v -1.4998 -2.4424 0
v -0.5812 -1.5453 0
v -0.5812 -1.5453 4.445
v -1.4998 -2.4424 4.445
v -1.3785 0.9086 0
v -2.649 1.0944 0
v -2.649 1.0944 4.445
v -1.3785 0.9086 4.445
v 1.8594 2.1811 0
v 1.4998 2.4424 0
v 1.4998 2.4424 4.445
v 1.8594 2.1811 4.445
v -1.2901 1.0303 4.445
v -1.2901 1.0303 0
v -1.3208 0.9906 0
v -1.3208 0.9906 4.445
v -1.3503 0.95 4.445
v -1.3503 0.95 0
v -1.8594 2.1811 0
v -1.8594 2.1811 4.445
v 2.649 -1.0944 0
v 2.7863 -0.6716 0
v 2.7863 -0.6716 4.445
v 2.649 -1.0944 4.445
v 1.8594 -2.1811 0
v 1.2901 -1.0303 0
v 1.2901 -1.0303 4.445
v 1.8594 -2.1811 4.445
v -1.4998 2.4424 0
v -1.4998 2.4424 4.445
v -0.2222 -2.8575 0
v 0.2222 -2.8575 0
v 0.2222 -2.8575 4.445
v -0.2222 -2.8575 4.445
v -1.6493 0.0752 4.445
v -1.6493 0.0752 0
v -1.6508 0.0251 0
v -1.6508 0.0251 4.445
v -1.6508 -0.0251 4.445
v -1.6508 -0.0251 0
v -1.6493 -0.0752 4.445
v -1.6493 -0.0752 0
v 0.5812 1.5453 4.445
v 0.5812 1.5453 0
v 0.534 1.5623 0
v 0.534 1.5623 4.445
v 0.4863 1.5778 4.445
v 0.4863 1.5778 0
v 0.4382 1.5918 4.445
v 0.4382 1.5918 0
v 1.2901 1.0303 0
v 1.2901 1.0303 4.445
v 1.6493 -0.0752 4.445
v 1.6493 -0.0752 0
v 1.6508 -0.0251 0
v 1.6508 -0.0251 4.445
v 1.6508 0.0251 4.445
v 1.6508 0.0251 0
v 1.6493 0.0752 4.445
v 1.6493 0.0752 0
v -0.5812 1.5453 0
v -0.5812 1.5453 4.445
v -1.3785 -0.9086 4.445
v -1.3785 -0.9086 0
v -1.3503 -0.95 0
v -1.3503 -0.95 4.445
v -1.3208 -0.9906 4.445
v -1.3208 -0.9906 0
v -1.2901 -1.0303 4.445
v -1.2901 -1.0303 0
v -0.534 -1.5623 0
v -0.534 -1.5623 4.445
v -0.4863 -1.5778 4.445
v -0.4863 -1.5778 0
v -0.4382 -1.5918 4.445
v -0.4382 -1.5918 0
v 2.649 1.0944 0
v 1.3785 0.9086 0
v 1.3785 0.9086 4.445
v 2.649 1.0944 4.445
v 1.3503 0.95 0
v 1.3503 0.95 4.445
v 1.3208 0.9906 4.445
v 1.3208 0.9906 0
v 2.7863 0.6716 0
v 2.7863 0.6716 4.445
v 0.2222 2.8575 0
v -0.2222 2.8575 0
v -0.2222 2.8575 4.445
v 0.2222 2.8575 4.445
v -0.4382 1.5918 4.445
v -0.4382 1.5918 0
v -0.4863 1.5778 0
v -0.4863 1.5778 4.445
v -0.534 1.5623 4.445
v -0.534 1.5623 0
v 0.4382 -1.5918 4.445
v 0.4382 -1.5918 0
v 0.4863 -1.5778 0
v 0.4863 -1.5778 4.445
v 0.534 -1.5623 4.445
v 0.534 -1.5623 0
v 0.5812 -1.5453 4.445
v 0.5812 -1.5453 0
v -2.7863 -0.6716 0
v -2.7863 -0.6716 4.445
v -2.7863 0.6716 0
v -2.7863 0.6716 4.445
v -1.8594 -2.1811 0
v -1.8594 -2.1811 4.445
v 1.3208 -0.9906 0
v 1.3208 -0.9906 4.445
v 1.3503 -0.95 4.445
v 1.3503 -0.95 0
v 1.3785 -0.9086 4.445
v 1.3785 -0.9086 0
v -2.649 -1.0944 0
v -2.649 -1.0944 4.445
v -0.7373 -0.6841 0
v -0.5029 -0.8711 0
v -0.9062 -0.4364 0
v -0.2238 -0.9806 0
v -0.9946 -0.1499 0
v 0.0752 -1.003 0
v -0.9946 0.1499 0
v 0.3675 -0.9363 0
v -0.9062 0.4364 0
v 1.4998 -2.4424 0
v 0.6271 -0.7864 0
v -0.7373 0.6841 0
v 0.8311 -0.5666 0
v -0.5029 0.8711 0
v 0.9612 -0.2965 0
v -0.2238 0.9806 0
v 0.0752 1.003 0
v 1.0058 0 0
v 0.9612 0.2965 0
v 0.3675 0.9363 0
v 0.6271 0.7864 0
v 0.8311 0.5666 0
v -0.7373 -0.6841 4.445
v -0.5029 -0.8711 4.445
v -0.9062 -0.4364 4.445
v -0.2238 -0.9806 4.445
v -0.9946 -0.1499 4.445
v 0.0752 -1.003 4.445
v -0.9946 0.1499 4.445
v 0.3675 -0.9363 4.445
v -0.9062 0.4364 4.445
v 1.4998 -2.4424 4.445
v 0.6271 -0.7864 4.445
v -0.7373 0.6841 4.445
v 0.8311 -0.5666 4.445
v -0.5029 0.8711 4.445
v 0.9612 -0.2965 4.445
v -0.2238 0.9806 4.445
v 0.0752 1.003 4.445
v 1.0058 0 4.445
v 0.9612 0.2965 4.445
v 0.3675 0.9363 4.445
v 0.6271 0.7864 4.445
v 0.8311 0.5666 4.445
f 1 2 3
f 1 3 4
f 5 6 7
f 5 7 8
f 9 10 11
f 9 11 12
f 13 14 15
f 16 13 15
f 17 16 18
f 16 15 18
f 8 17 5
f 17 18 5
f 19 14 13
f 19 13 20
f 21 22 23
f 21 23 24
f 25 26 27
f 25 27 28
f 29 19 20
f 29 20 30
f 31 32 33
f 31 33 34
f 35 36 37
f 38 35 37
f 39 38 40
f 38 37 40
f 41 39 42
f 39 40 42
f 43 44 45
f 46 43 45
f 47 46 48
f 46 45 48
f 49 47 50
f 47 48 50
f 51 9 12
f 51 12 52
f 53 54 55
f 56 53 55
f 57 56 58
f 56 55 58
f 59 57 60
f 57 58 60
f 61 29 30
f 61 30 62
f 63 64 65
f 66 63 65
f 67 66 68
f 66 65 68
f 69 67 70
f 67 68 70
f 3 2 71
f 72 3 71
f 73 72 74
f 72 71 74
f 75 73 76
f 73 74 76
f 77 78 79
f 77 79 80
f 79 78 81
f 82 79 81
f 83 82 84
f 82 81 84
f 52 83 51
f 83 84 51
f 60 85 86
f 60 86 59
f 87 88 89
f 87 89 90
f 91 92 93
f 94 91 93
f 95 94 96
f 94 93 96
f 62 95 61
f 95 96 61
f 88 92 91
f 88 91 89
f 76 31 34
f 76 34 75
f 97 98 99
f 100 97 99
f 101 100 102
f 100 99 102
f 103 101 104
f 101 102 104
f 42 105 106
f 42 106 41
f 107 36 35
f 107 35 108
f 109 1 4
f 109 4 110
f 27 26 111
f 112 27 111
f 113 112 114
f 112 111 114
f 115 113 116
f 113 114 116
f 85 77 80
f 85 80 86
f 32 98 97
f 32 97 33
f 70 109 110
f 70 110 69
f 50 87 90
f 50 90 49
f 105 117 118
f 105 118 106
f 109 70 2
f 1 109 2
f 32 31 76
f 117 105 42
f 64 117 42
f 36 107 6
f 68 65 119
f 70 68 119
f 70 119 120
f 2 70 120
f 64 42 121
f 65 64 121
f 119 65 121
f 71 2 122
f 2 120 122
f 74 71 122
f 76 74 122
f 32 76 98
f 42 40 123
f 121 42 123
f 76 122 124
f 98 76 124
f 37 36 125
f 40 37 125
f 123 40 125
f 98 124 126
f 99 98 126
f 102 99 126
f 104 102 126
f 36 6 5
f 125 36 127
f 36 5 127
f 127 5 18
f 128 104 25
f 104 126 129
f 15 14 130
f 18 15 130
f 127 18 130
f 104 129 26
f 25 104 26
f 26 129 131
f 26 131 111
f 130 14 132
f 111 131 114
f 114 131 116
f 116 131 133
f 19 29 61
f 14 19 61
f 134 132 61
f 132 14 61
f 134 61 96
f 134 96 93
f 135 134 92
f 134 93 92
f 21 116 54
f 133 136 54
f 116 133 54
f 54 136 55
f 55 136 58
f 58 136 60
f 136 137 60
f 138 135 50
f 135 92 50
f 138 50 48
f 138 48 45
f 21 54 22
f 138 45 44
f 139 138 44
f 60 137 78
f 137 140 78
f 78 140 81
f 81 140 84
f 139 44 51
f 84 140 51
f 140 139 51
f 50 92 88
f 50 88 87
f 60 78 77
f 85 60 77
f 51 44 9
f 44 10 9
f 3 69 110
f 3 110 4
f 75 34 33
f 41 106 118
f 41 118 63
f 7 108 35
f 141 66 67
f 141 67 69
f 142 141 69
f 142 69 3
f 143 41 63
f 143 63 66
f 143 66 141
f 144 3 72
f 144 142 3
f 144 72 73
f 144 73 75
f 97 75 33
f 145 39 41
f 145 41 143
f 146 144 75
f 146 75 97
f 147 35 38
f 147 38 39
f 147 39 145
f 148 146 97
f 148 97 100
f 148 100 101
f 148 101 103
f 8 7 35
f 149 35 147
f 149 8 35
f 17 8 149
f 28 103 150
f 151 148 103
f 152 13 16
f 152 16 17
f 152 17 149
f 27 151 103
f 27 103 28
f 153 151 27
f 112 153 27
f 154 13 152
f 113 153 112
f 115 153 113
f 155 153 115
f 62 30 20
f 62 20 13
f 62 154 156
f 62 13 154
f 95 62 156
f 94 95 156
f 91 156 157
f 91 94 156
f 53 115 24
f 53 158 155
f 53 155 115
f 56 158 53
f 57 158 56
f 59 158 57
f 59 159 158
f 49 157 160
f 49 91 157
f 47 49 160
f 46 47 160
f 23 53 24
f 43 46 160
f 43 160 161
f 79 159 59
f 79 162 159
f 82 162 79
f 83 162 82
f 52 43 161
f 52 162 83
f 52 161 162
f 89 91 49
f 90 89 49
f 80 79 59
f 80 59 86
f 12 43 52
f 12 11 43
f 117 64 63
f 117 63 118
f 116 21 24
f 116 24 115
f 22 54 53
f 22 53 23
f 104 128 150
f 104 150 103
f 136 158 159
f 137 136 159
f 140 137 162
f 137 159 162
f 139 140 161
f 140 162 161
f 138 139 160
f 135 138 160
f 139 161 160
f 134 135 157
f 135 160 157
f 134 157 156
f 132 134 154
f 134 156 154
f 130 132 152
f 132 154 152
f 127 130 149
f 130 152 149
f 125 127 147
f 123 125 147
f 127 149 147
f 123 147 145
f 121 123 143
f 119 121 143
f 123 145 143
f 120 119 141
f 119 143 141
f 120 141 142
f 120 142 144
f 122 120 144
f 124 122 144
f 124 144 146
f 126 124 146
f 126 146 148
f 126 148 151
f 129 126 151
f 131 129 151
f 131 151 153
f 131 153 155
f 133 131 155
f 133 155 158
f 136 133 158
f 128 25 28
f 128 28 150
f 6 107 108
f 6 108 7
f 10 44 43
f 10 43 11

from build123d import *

# Parameters (mm, degrees)
SKETCH1_R           = 1.651
BOSS_EXTRUDE1_DEPTH = 4.445
SKETCH2_R           = 1.00584
CUT_EXTRUDE1_DEPTH  = 6.973853634


with BuildPart() as part:
    # Sketch1 → Boss-Extrude1 (new body)
    with BuildSketch(Plane.XY):
        Circle(SKETCH1_R)
        Polygon((-0.22225, 2.8575), (0.22225, 2.8575), (0.43815, 1.591799478), (-0.43815, 1.591799478), align=None)
        Polygon((1.859400385, 2.181130789), (1.290107054, 1.030254721), (0.581165462, 1.545330937), (1.499792331, 2.442401334), align=None)
        Polygon((2.786323022, 0.671643751), (1.649287062, 0.075187678), (1.37849547, 0.908598503), (2.648964968, 1.094388372), align=None)
        Polygon((2.648964968, -1.094388372), (1.37849547, -0.908598503), (1.649287062, -0.075187678), (2.786323022, -0.671643751), align=None)
        Polygon((1.499792331, -2.442401334), (0.581165462, -1.545330937), (1.290107054, -1.030254721), (1.859400385, -2.181130789), align=None)
        Polygon((-0.22225, -2.8575), (-0.43815, -1.591799478), (0.43815, -1.591799478), (0.22225, -2.8575), align=None)
        Polygon((-1.859400385, -2.181130789), (-1.290107054, -1.030254721), (-0.581165462, -1.545330937), (-1.499792331, -2.442401334), align=None)
        Polygon((-2.786323022, -0.671643751), (-1.649287062, -0.075187678), (-1.37849547, -0.908598503), (-2.648964968, -1.094388372), align=None)
        Polygon((-2.648964968, 1.094388372), (-1.37849547, 0.908598503), (-1.649287062, 0.075187678), (-2.786323022, 0.671643751), align=None)
        Polygon((-1.499792331, 2.442401334), (-0.581165462, 1.545330937), (-1.290107054, 1.030254721), (-1.859400385, 2.181130789), align=None)
    extrude(amount=BOSS_EXTRUDE1_DEPTH)

    # Sketch2 → Cut-Extrude1 (cut, through all)
    with BuildSketch(Plane.XY.offset(4.445)):
        Circle(SKETCH2_R)
    extrude(amount=-CUT_EXTRUDE1_DEPTH, mode=Mode.SUBTRACT)


solid = part.part
